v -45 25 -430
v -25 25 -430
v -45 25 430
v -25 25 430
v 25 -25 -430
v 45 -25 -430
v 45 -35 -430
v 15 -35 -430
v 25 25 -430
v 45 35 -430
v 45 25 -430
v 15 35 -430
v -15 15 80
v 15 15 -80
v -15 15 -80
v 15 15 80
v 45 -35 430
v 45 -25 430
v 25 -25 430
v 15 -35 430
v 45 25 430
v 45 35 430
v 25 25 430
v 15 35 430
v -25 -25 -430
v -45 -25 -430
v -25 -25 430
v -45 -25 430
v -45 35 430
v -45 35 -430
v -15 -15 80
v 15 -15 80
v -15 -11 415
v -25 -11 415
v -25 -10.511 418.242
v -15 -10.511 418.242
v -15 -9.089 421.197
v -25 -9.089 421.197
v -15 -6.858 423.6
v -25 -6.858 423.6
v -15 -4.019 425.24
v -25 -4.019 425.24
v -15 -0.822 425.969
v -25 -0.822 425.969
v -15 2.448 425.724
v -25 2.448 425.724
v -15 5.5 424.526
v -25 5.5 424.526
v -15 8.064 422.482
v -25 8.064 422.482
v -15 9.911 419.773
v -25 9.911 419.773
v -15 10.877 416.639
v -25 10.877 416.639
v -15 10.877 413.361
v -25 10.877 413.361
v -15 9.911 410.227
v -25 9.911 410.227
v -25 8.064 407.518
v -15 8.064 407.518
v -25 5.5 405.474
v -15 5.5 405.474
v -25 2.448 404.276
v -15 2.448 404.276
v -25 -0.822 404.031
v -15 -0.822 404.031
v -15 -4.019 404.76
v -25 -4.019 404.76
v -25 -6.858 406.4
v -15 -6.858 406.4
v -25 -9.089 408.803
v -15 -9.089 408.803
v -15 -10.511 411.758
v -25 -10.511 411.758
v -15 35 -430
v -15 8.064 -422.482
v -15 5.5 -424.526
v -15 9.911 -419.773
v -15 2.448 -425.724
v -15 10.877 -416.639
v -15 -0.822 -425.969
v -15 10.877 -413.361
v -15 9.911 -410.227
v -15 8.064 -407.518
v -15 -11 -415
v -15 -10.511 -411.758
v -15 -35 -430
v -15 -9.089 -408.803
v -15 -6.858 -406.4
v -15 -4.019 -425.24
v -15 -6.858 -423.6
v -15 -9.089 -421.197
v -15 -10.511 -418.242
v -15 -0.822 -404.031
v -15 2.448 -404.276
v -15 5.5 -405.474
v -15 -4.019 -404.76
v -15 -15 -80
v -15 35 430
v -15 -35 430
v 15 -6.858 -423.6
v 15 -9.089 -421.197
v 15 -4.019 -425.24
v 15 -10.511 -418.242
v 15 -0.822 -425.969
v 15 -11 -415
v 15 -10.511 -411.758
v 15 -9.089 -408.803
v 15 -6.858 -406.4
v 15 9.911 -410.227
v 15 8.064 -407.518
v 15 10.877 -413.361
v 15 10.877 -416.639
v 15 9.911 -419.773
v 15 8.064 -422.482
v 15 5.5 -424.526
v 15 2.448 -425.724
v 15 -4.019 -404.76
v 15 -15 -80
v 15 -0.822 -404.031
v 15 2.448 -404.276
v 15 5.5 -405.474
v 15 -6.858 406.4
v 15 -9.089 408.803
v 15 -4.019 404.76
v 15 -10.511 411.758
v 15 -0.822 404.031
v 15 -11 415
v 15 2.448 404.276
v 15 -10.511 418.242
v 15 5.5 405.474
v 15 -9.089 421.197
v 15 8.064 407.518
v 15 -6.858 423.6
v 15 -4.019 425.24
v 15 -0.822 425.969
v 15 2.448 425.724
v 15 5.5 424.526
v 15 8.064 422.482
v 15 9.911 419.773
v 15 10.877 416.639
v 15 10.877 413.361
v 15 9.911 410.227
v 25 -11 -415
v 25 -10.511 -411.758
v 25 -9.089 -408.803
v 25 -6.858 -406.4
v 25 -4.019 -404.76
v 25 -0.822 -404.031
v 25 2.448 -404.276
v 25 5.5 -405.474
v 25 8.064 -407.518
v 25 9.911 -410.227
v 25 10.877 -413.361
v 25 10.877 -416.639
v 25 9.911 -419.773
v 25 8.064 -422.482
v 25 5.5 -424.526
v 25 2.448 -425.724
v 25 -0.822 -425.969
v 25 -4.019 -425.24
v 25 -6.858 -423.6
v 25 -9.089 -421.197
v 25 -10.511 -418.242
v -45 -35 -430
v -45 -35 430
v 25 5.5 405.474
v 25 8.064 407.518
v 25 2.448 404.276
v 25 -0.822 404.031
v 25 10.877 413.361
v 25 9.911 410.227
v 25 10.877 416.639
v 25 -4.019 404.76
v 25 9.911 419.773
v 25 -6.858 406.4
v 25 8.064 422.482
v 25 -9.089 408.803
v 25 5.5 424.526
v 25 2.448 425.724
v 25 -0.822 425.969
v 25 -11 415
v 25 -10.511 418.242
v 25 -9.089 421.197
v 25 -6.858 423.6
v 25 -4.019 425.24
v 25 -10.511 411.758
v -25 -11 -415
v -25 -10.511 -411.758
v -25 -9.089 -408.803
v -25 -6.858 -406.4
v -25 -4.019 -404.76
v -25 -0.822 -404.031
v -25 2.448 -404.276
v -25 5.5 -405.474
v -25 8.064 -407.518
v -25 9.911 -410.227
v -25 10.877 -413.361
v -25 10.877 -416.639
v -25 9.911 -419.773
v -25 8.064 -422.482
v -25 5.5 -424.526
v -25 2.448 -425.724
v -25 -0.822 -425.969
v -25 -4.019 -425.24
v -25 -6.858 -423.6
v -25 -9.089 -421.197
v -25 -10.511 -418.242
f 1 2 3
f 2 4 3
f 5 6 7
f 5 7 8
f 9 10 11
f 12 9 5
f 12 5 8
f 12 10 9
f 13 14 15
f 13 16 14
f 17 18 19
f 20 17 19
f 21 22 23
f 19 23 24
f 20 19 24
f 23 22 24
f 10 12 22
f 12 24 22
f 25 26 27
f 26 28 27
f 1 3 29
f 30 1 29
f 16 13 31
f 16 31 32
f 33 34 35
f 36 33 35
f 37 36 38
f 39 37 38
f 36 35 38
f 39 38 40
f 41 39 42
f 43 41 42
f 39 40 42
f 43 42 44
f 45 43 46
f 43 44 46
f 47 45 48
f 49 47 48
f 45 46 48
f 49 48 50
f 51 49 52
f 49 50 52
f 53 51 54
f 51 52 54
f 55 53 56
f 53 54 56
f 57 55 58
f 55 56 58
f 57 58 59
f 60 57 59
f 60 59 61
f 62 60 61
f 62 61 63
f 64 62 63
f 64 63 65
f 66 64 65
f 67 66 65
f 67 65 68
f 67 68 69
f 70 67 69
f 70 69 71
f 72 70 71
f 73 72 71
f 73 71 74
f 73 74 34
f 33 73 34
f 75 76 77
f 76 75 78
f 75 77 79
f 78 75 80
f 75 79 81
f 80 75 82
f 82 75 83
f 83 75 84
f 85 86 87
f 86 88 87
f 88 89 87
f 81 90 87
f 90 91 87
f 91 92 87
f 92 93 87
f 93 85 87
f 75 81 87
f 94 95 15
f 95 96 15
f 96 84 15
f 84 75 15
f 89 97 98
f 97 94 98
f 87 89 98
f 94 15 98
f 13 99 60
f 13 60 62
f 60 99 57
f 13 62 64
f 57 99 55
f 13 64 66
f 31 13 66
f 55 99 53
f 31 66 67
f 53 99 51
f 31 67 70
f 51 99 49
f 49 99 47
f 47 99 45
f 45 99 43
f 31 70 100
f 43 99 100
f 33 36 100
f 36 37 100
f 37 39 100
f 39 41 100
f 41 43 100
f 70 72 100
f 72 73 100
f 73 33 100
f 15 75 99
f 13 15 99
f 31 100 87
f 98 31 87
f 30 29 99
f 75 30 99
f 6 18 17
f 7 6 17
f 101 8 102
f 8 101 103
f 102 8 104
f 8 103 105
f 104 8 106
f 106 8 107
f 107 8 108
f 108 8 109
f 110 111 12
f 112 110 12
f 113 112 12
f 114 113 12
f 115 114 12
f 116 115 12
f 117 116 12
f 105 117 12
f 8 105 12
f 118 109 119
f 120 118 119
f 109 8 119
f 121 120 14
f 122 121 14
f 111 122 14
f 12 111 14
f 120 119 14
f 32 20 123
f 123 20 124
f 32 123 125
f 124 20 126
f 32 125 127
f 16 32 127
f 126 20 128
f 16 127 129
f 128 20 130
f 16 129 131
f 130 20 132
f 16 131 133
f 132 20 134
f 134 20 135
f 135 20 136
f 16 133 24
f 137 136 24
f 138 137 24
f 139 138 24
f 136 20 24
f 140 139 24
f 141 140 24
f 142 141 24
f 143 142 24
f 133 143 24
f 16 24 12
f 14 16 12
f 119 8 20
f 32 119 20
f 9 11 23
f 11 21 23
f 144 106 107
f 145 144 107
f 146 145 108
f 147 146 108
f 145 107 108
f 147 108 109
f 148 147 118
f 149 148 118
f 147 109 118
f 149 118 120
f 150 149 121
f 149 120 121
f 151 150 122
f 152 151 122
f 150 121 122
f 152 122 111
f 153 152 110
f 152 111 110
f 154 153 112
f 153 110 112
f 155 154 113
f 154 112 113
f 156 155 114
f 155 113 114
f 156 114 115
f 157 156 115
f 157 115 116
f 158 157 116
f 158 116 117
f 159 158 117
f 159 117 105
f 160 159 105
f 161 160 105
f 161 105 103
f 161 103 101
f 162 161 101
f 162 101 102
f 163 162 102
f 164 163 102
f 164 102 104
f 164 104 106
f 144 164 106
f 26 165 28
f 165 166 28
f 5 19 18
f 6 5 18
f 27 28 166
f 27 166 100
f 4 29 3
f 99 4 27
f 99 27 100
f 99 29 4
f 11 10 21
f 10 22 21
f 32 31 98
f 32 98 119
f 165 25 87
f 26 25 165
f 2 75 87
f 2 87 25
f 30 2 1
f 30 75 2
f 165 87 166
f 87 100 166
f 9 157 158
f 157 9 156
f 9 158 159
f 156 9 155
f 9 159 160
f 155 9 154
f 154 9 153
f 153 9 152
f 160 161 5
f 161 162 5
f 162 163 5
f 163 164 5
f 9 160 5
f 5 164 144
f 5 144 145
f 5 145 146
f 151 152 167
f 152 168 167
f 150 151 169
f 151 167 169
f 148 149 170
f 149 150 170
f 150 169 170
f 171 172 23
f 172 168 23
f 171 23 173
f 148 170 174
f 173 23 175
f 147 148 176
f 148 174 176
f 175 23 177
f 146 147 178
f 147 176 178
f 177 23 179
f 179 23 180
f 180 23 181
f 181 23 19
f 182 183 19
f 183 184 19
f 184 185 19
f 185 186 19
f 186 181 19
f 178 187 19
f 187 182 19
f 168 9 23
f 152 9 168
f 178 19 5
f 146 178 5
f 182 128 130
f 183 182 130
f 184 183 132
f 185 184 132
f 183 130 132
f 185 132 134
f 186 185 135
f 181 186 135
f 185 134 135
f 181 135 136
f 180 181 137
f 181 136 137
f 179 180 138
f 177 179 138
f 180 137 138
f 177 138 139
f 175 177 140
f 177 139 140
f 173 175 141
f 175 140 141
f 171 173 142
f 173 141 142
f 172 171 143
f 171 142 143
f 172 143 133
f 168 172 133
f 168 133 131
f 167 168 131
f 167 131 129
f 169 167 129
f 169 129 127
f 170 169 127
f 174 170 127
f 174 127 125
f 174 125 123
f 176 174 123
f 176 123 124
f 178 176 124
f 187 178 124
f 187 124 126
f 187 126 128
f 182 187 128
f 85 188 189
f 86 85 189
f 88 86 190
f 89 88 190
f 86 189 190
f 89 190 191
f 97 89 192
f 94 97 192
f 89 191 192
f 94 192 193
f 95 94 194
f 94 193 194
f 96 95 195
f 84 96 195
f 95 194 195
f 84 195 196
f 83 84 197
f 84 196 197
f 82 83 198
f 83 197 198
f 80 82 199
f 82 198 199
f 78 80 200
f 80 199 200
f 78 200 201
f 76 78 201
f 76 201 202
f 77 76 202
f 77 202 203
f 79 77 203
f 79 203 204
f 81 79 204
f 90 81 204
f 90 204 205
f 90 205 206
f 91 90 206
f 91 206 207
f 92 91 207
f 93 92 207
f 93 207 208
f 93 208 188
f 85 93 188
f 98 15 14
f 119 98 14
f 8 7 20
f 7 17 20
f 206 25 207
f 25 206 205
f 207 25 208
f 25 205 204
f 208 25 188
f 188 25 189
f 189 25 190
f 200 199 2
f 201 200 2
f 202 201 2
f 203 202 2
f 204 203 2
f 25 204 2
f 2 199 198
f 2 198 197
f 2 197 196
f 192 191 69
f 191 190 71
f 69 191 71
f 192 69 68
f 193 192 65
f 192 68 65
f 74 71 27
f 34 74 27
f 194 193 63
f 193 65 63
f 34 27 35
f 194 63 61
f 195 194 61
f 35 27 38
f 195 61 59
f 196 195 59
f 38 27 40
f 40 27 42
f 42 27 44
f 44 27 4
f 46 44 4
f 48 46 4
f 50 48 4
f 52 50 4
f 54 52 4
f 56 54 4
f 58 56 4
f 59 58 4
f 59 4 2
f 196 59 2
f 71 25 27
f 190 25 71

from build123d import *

# Parameters (mm, degrees)
BOSS_EXTRUDE1_DEPTH = 80
BOSS_EXTRUDE2_DEPTH = 350
BOSS_EXTRUDE3_DEPTH = 350
SKETCH4_R           = 11
CUT_EXTRUDE1_DEPTH  = 350


with BuildPart() as part:
    # Sketch1 → Boss-Extrude1 (new, symmetric)
    with BuildSketch(Plane.XY):
        Polygon((15, 15), (-15, 15), (-15, 35), (-45, 35), (-45, 25), (-25, 25), (-25, -25), (-45, -25), (-45, -35), (-15, -35), (-15, -15), (15, -15), (15, -35), (45, -35), (45, -25), (25, -25), (25, 25), (45, 25), (45, 35), (15, 35), align=None)
    extrude(amount=BOSS_EXTRUDE1_DEPTH, both=True)

    # Sketch2 → Boss-Extrude2 (add)
    with BuildSketch(Plane.XY.offset(80)):
        Polygon((-45, -25), (-45, -35), (-15, -35), (-15, 35), (-45, 35), (-45, 25), (-25, 25), (-25, -25), align=None)
        Polygon((15, 35), (45, 35), (45, 25), (25, 25), (25, -25), (45, -25), (45, -35), (15, -35), align=None)
    extrude(amount=BOSS_EXTRUDE2_DEPTH)

    # Sketch3 → Boss-Extrude3 (add)
    with BuildSketch(Plane(origin=(0, 0, -80), x_dir=(-1, 0, 0), z_dir=(0, 0, -1))):
        Polygon((-45, -25), (-45, -35), (-15, -35), (-15, 35), (-45, 35), (-45, 25), (-25, 25), (-25, -25), align=None)
        Polygon((45, 35), (15, 35), (15, -35), (45, -35), (45, -25), (25, -25), (25, 25), (45, 25), align=None)
    extrude(amount=BOSS_EXTRUDE3_DEPTH)

    # Sketch4 → Cut-Extrude1 (cut)
    with BuildSketch(Plane.ZY.offset(25)):
        with Locations(Location((-415, 0, 0), (0, 0, 270))):
            Circle(SKETCH4_R)
        with Locations(Location((415, 0, 0), (0, 0, 270))):
            Circle(SKETCH4_R)
    extrude(amount=-CUT_EXTRUDE1_DEPTH, mode=Mode.SUBTRACT)


solid = part.part
